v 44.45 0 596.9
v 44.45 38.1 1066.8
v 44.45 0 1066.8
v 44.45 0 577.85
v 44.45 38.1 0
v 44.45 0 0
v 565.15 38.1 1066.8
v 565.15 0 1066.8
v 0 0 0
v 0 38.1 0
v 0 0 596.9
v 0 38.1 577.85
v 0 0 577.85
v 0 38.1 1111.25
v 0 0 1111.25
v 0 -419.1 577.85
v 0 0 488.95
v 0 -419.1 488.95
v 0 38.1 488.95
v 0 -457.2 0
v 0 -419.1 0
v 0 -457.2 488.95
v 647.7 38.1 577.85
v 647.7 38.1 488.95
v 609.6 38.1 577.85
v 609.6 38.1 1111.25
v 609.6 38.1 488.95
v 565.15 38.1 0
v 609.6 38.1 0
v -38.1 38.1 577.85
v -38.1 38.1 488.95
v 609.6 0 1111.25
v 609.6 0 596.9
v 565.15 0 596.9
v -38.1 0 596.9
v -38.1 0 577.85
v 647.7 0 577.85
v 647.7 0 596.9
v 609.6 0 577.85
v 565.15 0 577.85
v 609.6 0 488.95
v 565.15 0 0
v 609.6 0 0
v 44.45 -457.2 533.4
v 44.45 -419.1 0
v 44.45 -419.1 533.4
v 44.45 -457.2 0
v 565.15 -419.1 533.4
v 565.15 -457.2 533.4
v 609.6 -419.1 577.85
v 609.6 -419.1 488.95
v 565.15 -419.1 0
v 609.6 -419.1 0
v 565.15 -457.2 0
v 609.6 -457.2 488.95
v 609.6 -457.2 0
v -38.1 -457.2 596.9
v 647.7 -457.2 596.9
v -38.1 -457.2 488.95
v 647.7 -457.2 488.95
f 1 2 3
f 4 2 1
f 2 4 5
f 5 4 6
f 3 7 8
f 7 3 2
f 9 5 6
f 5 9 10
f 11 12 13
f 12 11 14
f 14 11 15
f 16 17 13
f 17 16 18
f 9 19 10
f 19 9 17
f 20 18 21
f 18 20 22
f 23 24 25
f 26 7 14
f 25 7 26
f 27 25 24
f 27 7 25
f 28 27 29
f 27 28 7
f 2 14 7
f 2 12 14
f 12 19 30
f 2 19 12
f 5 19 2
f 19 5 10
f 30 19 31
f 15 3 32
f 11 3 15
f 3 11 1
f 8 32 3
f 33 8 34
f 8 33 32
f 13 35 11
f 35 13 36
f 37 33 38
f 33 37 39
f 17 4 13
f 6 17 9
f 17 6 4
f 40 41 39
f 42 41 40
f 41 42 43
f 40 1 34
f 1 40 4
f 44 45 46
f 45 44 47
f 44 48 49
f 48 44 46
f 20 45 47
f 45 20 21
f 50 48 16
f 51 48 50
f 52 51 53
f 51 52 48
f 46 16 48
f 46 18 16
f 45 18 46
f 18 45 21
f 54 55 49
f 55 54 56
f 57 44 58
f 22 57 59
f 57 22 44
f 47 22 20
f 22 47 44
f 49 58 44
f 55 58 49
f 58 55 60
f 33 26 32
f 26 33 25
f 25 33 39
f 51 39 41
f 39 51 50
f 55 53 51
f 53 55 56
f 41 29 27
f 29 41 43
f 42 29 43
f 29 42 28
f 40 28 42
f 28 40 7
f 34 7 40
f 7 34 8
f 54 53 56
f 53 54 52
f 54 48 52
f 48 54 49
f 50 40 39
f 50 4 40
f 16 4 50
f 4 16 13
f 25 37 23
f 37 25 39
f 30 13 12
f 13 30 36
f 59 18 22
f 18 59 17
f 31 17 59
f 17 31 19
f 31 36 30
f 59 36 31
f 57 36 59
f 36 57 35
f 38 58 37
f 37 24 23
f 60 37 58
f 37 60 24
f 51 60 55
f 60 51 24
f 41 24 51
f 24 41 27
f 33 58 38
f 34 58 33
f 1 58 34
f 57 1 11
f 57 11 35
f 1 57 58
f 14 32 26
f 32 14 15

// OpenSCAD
ttlw=inches(24);
rot=0;

for(x=[0,ttlw-inches(1.75)])
{
  translate([x,0]) twobytwo(3.5);
  translate([x,-1*inches(18)]) twobytwo(1.75);
}
color("green") translate([0,0,inches(12)*3.5+inches(1.75)]) rotate([0,90]) twobytwo(2);
translate([0,inches(3/4),inches(20)]) rotate([rot,0]) translate([0,-inches(3/4),-inches(20)]) union() {
color("green") translate([0,-1*inches(18),inches(1.75)+inches(12)*1.75]) rotate([0,90]) twobytwo(2);
color("blue") for(x=[-inches(1.5),inches(24)],z=[inches(19.25)]) translate([x,-inches(18),z]) cube([inches(1.5),inches(19.5),inches(3.5)]);
translate([-inches(1.5),-inches(18),inches(22.75)]) color("brown") cube([inches(27),inches(18),inches(3/4)]);
}
*for(y=[0:inches(13)/3:inches(13)]) translate([-inches(1.5),-inches(16.5)+y,inches(9.5)]) cube([inches(27),inches(3.5),inches(1.5)]);

module twobytwo(foot_len)
{
  cube([inches(1.75),inches(1.5),inches(foot_len*12)]); 
}
module twobyfour(foot_len)
{
  cube([inches(3.5),inches(1.5),inches(foot_len*12)]); 
}

module mirrorx(off=0) {
  translate([off/2,0]) for(m=[0,1]) mirror([m,0]) translate([off/-2,0]) children();
}
module mirrory(off=0) {
  translate([0,off/2]) for(m=[0,1]) mirror([0,m]) translate([0,off/-2]) children();
}
function inches(in) = in * 25.4;
